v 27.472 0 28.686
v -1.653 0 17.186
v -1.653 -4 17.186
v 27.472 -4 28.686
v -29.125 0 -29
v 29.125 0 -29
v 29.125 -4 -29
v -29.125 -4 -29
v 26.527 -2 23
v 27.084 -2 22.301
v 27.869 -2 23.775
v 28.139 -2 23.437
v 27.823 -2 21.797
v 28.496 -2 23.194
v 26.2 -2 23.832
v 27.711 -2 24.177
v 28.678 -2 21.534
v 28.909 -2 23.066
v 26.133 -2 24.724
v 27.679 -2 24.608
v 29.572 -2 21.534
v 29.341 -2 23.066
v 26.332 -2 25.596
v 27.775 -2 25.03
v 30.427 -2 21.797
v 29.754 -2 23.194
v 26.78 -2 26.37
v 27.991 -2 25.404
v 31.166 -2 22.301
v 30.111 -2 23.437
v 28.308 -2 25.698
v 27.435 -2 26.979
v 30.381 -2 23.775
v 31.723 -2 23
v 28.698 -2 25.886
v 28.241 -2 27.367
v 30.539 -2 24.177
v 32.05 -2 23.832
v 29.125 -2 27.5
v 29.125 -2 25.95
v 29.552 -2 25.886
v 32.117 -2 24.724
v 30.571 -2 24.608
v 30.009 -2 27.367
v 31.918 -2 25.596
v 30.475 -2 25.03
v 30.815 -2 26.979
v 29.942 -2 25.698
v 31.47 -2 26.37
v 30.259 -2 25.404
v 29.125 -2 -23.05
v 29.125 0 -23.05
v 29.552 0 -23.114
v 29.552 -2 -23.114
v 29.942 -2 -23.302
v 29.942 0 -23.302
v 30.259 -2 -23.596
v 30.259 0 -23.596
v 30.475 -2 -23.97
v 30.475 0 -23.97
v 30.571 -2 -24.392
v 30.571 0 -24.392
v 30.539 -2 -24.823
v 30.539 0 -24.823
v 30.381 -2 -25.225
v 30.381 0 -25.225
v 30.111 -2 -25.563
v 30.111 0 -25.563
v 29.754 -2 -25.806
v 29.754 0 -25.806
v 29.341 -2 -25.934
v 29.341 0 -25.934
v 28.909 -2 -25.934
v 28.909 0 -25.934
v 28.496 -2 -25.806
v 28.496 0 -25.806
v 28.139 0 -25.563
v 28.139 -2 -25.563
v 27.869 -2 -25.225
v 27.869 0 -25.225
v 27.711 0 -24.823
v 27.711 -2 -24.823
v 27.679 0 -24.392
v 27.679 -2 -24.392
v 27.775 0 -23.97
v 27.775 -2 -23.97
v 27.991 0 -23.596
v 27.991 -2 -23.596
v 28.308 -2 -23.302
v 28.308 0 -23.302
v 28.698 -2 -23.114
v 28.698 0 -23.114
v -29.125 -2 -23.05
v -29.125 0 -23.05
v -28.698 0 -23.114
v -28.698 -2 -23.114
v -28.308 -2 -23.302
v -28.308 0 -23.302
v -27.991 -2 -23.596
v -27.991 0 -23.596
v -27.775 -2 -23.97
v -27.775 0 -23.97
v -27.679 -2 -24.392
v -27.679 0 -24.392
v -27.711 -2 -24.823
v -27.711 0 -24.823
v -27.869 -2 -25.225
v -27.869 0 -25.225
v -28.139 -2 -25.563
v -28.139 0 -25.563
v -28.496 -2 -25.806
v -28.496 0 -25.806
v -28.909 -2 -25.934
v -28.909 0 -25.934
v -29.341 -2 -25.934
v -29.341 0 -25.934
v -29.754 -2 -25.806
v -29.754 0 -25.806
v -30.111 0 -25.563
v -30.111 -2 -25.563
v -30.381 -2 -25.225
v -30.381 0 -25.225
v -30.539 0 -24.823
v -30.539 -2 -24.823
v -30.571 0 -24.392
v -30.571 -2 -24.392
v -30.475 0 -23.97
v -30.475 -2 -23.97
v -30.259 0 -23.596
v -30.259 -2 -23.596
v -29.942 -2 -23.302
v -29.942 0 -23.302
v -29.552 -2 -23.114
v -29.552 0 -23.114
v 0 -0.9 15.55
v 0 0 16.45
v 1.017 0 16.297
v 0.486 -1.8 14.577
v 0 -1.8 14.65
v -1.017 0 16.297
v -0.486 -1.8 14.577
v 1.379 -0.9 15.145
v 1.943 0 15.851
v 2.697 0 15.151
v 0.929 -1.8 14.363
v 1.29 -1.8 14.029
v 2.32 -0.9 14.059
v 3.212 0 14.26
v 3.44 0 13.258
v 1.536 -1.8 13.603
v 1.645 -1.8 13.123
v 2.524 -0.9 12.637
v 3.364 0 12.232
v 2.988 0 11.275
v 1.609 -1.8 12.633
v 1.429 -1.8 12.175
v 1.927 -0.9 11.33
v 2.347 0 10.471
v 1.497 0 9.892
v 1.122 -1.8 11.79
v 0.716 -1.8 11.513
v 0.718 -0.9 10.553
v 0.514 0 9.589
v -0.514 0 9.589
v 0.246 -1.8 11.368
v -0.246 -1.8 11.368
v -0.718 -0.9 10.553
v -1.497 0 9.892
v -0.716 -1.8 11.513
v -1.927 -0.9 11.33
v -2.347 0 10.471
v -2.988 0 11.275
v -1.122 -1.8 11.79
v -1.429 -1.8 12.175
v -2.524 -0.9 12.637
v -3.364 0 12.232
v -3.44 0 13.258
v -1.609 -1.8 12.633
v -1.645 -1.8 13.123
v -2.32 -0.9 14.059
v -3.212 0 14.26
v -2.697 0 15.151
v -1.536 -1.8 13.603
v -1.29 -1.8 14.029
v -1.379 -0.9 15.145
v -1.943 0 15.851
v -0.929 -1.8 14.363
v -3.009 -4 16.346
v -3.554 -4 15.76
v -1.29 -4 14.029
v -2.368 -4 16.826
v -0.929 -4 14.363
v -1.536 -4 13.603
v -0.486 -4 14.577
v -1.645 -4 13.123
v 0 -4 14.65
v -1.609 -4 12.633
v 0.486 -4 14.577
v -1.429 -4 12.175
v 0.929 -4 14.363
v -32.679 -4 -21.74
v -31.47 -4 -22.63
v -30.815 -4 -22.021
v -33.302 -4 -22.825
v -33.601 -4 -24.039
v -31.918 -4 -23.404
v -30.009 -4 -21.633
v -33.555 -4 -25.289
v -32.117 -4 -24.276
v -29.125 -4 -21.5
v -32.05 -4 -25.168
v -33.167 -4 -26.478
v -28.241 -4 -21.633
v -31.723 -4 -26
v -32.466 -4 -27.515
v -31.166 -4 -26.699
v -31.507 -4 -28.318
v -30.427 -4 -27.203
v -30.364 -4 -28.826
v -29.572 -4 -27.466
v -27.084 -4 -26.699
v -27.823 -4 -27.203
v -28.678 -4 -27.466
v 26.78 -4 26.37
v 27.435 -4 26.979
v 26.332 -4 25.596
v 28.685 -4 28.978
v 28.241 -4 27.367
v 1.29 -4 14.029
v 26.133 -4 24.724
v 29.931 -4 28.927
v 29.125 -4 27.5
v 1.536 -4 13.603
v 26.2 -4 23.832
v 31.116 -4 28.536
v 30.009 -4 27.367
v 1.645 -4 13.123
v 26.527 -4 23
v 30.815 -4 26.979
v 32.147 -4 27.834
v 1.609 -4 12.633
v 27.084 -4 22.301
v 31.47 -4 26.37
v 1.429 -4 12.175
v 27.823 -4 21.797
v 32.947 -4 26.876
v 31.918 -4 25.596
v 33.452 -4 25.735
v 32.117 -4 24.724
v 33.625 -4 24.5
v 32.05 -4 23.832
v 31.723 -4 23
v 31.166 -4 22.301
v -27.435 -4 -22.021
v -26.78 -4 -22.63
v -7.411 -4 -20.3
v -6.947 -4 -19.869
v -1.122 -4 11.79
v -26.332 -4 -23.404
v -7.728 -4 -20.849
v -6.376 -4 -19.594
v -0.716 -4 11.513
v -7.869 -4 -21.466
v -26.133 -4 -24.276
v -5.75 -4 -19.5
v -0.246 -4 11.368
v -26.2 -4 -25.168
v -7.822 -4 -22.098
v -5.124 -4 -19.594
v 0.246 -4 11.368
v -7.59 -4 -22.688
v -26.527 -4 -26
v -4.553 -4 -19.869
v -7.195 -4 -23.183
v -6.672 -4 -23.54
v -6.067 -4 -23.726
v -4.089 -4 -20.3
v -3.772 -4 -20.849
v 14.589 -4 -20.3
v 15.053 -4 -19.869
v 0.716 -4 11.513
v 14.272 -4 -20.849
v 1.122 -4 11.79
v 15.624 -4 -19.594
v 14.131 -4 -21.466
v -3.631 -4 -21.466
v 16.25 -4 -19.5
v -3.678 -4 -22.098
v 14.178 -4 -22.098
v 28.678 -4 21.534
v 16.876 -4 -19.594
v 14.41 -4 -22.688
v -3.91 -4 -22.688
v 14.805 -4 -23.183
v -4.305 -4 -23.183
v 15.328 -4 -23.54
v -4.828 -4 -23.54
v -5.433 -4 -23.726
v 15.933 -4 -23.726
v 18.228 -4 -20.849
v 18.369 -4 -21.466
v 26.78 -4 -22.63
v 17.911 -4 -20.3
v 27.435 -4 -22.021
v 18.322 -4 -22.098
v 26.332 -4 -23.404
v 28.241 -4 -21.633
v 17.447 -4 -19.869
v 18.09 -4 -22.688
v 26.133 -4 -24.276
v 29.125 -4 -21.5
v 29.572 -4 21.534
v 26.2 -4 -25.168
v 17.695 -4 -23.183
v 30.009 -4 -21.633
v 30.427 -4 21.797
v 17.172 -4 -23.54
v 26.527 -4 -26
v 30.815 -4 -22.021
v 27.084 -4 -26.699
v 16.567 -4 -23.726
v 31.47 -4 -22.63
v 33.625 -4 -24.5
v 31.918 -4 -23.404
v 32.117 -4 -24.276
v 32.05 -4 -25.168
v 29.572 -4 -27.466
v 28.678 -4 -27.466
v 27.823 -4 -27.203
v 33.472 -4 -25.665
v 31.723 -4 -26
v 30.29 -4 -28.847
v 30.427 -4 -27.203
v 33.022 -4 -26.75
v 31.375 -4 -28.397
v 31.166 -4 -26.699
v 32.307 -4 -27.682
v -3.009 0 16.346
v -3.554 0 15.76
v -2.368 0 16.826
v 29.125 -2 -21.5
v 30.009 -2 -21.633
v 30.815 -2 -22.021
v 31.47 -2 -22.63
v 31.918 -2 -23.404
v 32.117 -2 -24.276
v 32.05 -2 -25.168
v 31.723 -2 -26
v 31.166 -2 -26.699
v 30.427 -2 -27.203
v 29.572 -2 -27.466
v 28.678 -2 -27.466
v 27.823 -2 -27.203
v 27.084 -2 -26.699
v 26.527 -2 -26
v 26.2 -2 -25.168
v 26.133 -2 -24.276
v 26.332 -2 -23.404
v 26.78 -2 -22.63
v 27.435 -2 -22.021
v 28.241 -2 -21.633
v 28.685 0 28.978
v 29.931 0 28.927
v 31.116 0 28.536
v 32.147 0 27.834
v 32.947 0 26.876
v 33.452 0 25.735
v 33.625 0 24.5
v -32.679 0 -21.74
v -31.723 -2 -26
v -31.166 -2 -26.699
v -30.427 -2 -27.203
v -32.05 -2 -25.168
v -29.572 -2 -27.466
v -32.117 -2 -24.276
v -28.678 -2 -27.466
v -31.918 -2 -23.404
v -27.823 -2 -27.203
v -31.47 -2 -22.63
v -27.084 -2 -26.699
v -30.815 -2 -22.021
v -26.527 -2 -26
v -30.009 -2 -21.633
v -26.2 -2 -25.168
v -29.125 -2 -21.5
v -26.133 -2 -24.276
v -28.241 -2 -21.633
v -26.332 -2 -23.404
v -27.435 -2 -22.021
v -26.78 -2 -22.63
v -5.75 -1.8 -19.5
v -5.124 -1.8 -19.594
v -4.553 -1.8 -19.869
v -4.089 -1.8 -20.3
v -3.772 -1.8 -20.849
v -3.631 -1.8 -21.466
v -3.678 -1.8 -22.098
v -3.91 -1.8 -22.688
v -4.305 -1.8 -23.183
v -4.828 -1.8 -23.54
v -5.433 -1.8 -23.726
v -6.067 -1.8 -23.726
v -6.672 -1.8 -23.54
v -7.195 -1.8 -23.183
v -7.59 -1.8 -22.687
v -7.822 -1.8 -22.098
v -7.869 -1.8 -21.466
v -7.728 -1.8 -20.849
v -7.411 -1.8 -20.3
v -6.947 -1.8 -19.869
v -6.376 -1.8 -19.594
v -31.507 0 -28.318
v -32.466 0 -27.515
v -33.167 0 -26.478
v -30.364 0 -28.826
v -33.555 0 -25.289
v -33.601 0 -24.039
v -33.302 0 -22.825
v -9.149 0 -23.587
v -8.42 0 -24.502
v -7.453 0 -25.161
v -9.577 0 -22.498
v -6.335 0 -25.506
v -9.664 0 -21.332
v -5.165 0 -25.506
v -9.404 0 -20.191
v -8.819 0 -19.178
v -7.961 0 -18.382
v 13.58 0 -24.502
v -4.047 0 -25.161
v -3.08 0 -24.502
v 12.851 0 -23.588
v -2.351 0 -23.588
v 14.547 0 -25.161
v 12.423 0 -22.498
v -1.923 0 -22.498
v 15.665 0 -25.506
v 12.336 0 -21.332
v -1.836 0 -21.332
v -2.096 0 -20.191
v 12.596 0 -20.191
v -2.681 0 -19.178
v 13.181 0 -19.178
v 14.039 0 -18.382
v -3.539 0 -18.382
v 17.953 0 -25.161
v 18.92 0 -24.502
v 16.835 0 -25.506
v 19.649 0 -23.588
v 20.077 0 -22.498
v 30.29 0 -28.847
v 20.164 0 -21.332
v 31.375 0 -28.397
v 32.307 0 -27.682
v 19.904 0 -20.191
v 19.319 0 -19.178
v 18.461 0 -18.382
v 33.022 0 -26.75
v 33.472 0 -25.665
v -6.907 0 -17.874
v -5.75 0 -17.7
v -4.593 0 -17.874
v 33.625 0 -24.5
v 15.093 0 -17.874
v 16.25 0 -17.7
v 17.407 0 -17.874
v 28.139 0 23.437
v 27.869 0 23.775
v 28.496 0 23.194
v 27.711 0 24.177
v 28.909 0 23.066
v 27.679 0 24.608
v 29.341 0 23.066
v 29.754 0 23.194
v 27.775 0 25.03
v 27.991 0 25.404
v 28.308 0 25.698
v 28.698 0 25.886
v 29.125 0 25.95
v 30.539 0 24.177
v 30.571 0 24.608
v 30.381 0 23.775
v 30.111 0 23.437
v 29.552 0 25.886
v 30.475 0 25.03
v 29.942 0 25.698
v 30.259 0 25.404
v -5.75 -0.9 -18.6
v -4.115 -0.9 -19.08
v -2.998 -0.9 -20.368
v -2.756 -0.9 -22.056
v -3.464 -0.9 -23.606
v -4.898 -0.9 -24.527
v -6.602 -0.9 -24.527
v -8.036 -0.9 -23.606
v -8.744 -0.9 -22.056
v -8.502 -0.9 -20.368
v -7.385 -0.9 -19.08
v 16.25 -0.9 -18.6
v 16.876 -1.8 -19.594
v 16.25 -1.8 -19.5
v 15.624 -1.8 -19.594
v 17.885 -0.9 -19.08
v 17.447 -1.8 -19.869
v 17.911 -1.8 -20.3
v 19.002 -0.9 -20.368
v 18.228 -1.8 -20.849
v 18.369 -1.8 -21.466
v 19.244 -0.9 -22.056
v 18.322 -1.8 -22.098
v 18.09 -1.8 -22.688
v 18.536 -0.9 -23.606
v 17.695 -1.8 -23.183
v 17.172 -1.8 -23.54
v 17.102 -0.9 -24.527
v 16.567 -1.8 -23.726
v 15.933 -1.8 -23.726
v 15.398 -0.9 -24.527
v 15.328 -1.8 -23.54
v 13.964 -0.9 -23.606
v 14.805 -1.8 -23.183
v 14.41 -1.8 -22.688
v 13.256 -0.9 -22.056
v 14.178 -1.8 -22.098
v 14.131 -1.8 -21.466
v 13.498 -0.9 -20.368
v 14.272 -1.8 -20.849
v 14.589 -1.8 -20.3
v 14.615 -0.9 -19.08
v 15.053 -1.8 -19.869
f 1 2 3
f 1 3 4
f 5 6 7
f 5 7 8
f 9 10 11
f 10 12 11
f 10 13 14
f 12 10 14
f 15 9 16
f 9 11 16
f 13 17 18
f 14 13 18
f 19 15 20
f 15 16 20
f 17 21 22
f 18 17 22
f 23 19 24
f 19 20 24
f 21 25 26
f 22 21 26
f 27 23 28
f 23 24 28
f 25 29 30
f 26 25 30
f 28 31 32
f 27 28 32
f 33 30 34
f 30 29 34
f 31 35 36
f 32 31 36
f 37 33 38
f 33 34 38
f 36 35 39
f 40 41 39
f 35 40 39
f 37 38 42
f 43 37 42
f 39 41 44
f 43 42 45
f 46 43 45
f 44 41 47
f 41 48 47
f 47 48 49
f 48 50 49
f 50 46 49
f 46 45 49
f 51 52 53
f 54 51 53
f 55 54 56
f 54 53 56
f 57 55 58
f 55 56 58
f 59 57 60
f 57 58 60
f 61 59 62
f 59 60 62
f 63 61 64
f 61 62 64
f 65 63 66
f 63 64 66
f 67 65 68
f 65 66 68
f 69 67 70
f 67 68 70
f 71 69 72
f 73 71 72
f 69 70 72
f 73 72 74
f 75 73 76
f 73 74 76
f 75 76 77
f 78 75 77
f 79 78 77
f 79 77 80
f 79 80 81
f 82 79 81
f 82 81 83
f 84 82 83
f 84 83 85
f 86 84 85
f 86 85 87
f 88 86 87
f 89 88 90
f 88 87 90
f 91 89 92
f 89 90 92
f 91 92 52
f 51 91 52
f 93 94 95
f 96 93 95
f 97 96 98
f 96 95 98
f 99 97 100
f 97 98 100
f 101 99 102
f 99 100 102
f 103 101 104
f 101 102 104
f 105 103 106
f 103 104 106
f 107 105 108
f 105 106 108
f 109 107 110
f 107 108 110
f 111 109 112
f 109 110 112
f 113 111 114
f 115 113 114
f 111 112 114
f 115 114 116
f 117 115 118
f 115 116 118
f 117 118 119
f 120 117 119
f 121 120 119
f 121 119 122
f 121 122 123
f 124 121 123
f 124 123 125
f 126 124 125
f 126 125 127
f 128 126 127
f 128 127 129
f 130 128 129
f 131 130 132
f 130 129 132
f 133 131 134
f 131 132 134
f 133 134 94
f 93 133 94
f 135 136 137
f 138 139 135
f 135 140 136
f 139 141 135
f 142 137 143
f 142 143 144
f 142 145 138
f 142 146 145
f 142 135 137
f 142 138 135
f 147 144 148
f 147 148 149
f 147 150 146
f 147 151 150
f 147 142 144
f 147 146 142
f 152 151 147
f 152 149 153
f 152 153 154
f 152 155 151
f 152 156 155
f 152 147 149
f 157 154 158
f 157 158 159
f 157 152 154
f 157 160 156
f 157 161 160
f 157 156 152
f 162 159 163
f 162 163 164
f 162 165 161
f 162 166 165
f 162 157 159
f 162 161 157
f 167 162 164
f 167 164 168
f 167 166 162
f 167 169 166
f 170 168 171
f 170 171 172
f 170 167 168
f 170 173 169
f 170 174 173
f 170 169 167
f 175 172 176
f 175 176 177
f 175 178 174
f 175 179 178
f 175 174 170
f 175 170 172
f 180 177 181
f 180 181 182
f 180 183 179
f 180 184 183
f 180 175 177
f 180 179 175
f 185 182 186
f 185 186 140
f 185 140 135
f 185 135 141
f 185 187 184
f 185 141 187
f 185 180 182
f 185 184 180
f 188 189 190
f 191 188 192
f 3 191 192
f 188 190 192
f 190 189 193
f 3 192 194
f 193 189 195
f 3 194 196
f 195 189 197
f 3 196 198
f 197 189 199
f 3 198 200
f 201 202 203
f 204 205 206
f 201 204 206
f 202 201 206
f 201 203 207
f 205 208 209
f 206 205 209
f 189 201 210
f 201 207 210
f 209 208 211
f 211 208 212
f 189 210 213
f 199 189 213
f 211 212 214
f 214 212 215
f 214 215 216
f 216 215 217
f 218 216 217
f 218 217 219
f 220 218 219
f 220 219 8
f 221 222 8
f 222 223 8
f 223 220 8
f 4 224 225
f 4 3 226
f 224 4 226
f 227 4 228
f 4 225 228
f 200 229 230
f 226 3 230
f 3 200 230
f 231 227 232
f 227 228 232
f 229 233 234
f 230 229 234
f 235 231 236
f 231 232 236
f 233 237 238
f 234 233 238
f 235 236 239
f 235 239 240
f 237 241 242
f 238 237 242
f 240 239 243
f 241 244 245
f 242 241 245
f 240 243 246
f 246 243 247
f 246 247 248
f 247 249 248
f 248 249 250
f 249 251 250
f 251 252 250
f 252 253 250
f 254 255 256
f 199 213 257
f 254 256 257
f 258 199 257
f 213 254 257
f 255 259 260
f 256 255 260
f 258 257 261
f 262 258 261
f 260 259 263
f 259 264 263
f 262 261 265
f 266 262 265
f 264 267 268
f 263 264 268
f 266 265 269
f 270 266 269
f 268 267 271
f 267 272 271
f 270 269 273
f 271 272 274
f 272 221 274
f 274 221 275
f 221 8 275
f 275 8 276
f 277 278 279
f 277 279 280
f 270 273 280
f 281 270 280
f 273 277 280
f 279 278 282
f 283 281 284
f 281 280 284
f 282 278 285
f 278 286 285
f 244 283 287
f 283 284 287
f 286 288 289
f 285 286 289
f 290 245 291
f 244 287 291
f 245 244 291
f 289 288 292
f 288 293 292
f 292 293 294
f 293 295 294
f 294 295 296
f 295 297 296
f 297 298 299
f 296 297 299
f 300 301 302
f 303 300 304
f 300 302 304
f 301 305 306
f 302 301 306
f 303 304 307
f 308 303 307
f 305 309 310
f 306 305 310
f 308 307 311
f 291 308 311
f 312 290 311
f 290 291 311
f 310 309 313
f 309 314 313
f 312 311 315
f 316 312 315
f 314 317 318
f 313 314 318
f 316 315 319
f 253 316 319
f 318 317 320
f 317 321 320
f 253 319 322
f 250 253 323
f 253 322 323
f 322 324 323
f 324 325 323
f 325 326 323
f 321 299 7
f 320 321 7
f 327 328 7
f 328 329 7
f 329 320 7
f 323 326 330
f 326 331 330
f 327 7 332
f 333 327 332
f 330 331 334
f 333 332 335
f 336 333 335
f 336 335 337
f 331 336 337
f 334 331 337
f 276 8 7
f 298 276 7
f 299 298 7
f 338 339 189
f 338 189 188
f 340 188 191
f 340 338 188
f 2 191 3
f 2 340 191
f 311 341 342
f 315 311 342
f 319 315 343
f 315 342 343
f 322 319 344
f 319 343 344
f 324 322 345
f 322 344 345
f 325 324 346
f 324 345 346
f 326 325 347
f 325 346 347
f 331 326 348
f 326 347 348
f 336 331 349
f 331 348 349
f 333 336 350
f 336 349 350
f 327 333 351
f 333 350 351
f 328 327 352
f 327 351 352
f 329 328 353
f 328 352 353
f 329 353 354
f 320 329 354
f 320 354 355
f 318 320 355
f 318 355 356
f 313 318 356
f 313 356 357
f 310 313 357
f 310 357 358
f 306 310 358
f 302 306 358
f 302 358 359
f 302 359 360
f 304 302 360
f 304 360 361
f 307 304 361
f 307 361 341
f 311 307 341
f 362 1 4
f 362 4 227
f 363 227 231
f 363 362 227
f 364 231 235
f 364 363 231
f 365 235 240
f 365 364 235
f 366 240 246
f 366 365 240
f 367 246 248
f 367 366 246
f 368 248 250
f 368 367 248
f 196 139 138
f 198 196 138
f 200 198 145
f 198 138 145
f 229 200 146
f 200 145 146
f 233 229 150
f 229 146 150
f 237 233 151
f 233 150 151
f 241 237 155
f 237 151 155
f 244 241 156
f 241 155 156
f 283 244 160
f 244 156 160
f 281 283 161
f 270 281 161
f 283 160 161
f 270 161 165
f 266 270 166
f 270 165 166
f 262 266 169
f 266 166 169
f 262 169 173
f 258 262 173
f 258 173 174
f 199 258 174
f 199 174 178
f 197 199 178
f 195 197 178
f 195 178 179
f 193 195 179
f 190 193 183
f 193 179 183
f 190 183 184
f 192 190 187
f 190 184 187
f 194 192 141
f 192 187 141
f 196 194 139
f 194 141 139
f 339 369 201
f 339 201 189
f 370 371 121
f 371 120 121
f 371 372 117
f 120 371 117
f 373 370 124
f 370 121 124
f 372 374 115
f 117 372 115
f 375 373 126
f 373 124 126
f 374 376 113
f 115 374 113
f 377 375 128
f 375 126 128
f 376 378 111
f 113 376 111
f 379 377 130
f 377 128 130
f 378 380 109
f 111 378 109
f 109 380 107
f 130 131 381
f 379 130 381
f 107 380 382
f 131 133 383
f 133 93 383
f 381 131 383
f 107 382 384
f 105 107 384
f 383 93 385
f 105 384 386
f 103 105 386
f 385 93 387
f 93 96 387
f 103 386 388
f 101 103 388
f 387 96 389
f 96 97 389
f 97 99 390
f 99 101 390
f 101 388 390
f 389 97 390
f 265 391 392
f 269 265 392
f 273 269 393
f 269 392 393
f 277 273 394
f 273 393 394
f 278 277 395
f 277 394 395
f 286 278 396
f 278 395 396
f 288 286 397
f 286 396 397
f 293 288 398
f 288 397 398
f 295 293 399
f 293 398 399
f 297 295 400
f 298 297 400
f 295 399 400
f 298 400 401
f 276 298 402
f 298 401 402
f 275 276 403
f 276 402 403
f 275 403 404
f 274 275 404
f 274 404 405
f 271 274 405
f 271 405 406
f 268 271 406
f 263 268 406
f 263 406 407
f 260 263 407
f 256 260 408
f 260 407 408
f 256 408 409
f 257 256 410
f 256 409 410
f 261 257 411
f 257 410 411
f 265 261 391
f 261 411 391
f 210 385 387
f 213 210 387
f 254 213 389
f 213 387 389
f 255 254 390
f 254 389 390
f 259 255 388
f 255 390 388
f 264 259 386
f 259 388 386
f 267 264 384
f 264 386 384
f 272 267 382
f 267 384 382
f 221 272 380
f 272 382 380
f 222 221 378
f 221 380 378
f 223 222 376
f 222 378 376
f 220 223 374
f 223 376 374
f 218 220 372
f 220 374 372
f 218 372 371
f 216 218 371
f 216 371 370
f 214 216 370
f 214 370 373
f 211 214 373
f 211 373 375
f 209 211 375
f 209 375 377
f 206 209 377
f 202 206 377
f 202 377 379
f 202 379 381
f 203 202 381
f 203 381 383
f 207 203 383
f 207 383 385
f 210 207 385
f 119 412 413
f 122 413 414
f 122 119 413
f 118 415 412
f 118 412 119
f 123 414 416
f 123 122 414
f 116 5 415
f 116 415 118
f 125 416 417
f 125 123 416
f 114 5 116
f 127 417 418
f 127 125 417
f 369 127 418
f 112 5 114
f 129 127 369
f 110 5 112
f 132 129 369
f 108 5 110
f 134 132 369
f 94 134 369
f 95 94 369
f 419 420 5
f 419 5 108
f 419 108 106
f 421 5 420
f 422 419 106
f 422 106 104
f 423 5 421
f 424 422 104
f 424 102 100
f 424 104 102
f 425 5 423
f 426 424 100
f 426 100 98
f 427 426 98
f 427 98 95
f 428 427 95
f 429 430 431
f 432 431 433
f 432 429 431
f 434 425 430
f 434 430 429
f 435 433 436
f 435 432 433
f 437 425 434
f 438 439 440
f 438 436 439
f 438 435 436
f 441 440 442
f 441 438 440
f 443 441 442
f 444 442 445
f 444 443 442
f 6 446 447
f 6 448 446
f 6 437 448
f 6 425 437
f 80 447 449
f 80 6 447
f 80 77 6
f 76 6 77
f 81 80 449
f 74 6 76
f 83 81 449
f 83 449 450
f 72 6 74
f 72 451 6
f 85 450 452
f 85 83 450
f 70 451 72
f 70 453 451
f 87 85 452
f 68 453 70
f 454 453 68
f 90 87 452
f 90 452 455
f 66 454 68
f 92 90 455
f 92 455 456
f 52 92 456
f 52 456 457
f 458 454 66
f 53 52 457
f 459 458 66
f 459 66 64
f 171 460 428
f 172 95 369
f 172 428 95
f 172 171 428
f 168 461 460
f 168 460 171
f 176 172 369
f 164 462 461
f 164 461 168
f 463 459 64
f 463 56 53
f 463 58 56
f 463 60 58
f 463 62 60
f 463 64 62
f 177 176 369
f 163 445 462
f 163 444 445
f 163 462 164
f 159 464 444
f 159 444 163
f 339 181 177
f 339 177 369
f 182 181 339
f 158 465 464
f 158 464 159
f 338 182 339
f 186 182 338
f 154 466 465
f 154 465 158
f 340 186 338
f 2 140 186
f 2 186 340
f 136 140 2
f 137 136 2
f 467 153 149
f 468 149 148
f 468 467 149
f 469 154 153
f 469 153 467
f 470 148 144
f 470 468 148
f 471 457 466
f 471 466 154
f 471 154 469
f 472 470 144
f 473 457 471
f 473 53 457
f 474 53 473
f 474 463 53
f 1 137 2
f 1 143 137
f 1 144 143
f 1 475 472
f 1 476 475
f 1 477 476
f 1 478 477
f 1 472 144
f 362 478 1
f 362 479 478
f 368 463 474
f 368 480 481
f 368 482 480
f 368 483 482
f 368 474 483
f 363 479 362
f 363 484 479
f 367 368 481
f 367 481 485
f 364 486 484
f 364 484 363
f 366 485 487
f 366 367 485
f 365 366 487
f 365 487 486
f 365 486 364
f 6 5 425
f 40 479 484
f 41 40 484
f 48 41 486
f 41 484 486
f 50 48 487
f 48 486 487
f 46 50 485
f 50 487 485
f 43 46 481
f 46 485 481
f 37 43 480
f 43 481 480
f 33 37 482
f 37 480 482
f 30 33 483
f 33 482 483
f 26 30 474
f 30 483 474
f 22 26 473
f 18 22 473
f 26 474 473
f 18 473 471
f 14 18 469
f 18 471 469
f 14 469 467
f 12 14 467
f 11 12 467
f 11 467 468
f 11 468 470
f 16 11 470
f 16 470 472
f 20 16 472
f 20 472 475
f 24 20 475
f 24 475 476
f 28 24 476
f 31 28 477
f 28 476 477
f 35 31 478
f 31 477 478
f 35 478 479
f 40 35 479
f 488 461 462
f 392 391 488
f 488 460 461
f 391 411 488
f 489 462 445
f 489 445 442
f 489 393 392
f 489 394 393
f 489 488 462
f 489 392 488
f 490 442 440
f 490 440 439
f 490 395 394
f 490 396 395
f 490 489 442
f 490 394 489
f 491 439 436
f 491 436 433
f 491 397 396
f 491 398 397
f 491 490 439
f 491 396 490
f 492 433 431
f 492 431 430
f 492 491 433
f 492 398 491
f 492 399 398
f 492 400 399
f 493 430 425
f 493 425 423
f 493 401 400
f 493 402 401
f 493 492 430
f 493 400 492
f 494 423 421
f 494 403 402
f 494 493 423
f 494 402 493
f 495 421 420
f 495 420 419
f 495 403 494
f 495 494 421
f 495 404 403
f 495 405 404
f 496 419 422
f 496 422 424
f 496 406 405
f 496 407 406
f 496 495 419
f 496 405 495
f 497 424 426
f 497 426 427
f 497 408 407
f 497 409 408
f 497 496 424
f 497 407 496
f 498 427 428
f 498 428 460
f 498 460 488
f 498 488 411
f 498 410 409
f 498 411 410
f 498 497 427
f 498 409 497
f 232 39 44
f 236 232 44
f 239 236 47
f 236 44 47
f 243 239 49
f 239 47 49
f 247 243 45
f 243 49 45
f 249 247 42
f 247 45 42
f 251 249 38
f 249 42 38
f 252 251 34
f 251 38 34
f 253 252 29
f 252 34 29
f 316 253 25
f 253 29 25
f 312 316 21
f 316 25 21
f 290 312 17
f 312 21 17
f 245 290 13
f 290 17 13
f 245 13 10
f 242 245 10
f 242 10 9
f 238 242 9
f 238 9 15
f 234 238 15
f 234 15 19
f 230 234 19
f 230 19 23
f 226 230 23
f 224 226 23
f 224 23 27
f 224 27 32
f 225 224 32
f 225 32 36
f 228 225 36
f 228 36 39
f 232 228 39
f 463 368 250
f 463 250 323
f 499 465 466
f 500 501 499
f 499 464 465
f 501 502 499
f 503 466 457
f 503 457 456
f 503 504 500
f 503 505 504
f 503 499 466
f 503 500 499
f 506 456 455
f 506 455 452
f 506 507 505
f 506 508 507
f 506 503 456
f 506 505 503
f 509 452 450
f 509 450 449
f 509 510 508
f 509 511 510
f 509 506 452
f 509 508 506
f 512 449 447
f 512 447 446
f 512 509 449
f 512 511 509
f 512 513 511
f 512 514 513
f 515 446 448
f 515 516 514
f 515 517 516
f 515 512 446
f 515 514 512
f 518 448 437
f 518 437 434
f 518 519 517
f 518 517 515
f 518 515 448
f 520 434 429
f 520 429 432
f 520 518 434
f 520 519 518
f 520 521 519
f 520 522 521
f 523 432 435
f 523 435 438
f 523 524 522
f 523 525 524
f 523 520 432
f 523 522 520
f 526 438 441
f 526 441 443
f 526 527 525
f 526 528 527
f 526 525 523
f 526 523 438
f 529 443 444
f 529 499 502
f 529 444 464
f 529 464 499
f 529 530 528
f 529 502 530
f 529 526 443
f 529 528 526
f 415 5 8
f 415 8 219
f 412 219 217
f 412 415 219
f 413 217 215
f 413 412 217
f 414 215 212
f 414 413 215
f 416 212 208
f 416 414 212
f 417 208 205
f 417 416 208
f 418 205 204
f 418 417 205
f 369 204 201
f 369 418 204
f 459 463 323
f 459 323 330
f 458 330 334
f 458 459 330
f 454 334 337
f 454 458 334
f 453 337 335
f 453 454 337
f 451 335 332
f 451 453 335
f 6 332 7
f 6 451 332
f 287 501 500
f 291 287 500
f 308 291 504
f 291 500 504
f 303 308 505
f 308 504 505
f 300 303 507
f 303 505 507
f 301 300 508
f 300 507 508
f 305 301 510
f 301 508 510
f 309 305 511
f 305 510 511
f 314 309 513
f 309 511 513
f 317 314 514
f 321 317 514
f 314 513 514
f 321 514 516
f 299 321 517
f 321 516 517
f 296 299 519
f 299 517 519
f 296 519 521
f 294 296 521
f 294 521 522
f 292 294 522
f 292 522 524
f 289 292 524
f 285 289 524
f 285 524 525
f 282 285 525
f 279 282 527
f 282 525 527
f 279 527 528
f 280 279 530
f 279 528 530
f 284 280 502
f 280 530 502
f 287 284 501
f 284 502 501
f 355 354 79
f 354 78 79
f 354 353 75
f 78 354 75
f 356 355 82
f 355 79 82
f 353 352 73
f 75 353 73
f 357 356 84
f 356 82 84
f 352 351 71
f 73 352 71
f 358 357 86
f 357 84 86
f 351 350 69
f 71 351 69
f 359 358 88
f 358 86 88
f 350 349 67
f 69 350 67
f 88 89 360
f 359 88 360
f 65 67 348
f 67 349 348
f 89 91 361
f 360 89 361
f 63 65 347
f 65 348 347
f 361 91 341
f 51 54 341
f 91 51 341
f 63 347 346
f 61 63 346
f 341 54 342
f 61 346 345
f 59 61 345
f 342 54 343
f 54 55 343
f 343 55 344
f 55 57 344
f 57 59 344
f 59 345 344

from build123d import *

# Parameters (mm, degrees)
SKETCH1_R           = 3
SKETCH1_R_2         = 1.65
SKETCH1_R_3         = 2.125
BOSS_EXTRUDE1_DEPTH = 4
SKETCH1_3_R         = 3
SKETCH1_3_R_2       = 1.45
BOSS_EXTRUDE2_DEPTH = 2
CHAMFER1_SIZE       = 1.8


with BuildPart() as part:
    # Sketch1 → Boss-Extrude1 (new body)
    with BuildSketch(Plane(origin=(0, 0, 0), x_dir=(1, 0, 0), z_dir=(0, 1, 0))):
        with BuildLine():
            ThreePointArc((-29.125, 29), (-33.166733686, 26.478481442), (-32.678997817, 21.739728362))
            Line((-32.678997817, 21.739728362), (-3.553997817, -15.760271638))
            ThreePointArc((-3.553997817, -15.760271638), (-2.699104035, -16.600671799), (-1.652658398, -17.185537029))
            Line((-1.652658398, -17.185537029), (27.472341602, -28.685537029))
            ThreePointArc((27.472341602, -28.685537029), (31.656110153, -28.22068292), (33.625, -24.5))
            Line((33.625, -24.5), (33.625, 24.5))
            ThreePointArc((33.625, 24.5), (32.306980515, 27.681980515), (29.125, 29))
            Line((29.125, 29), (-29.125, 29))
        make_face()
        with Locations((29.125, -24.5)):
            Circle(SKETCH1_R, mode=Mode.SUBTRACT)
        with Locations((0, -13)):
            Circle(SKETCH1_R_2, mode=Mode.SUBTRACT)
        with Locations((-29.125, 24.5)):
            Circle(SKETCH1_R, mode=Mode.SUBTRACT)
        with Locations((-5.75, 21.625)):
            Circle(SKETCH1_R_3, mode=Mode.SUBTRACT)
        with Locations((16.25, 21.625)):
            Circle(SKETCH1_R_3, mode=Mode.SUBTRACT)
        with Locations((29.125, 24.5)):
            Circle(SKETCH1_R, mode=Mode.SUBTRACT)
    extrude(amount=-BOSS_EXTRUDE1_DEPTH)

    # Sketch1<3> → Boss-Extrude2 (add)
    # profile 1 of 3: a face of its own
    with BuildSketch(Plane(origin=(0, 0, 0), x_dir=(1, 0, 0), z_dir=(0, 1, 0))):
        with Locations((29.125, -24.5)):
            Circle(SKETCH1_3_R)
        with Locations((29.125, -24.5)):
            Circle(SKETCH1_3_R_2, mode=Mode.SUBTRACT)
    # profile 2 of 3: a face of its own
    with BuildSketch(Plane(origin=(0, 0, 0), x_dir=(1, 0, 0), z_dir=(0, 1, 0))):
        with Locations((-29.125, 24.5)):
            Circle(SKETCH1_3_R)
        with Locations((-29.125, 24.5)):
            Circle(SKETCH1_3_R_2, mode=Mode.SUBTRACT)
    # profile 3 of 3: a face of its own
    with BuildSketch(Plane(origin=(0, 0, 0), x_dir=(1, 0, 0), z_dir=(0, 1, 0))):
        with Locations((29.125, 24.5)):
            Circle(SKETCH1_3_R)
        with Locations((29.125, 24.5)):
            Circle(SKETCH1_3_R_2, mode=Mode.SUBTRACT)
    extrude(amount=-BOSS_EXTRUDE2_DEPTH)

    # Chamfer1
    chamfer1_edges = [part.edges().sort_by_distance(p)[0] for p in [
        (-7.875, 0, -21.625),
        (14.125, 0, -21.625),
        (-1.65, 0, 13),
    ]]
    chamfer(chamfer1_edges, length=CHAMFER1_SIZE)


solid = part.part
